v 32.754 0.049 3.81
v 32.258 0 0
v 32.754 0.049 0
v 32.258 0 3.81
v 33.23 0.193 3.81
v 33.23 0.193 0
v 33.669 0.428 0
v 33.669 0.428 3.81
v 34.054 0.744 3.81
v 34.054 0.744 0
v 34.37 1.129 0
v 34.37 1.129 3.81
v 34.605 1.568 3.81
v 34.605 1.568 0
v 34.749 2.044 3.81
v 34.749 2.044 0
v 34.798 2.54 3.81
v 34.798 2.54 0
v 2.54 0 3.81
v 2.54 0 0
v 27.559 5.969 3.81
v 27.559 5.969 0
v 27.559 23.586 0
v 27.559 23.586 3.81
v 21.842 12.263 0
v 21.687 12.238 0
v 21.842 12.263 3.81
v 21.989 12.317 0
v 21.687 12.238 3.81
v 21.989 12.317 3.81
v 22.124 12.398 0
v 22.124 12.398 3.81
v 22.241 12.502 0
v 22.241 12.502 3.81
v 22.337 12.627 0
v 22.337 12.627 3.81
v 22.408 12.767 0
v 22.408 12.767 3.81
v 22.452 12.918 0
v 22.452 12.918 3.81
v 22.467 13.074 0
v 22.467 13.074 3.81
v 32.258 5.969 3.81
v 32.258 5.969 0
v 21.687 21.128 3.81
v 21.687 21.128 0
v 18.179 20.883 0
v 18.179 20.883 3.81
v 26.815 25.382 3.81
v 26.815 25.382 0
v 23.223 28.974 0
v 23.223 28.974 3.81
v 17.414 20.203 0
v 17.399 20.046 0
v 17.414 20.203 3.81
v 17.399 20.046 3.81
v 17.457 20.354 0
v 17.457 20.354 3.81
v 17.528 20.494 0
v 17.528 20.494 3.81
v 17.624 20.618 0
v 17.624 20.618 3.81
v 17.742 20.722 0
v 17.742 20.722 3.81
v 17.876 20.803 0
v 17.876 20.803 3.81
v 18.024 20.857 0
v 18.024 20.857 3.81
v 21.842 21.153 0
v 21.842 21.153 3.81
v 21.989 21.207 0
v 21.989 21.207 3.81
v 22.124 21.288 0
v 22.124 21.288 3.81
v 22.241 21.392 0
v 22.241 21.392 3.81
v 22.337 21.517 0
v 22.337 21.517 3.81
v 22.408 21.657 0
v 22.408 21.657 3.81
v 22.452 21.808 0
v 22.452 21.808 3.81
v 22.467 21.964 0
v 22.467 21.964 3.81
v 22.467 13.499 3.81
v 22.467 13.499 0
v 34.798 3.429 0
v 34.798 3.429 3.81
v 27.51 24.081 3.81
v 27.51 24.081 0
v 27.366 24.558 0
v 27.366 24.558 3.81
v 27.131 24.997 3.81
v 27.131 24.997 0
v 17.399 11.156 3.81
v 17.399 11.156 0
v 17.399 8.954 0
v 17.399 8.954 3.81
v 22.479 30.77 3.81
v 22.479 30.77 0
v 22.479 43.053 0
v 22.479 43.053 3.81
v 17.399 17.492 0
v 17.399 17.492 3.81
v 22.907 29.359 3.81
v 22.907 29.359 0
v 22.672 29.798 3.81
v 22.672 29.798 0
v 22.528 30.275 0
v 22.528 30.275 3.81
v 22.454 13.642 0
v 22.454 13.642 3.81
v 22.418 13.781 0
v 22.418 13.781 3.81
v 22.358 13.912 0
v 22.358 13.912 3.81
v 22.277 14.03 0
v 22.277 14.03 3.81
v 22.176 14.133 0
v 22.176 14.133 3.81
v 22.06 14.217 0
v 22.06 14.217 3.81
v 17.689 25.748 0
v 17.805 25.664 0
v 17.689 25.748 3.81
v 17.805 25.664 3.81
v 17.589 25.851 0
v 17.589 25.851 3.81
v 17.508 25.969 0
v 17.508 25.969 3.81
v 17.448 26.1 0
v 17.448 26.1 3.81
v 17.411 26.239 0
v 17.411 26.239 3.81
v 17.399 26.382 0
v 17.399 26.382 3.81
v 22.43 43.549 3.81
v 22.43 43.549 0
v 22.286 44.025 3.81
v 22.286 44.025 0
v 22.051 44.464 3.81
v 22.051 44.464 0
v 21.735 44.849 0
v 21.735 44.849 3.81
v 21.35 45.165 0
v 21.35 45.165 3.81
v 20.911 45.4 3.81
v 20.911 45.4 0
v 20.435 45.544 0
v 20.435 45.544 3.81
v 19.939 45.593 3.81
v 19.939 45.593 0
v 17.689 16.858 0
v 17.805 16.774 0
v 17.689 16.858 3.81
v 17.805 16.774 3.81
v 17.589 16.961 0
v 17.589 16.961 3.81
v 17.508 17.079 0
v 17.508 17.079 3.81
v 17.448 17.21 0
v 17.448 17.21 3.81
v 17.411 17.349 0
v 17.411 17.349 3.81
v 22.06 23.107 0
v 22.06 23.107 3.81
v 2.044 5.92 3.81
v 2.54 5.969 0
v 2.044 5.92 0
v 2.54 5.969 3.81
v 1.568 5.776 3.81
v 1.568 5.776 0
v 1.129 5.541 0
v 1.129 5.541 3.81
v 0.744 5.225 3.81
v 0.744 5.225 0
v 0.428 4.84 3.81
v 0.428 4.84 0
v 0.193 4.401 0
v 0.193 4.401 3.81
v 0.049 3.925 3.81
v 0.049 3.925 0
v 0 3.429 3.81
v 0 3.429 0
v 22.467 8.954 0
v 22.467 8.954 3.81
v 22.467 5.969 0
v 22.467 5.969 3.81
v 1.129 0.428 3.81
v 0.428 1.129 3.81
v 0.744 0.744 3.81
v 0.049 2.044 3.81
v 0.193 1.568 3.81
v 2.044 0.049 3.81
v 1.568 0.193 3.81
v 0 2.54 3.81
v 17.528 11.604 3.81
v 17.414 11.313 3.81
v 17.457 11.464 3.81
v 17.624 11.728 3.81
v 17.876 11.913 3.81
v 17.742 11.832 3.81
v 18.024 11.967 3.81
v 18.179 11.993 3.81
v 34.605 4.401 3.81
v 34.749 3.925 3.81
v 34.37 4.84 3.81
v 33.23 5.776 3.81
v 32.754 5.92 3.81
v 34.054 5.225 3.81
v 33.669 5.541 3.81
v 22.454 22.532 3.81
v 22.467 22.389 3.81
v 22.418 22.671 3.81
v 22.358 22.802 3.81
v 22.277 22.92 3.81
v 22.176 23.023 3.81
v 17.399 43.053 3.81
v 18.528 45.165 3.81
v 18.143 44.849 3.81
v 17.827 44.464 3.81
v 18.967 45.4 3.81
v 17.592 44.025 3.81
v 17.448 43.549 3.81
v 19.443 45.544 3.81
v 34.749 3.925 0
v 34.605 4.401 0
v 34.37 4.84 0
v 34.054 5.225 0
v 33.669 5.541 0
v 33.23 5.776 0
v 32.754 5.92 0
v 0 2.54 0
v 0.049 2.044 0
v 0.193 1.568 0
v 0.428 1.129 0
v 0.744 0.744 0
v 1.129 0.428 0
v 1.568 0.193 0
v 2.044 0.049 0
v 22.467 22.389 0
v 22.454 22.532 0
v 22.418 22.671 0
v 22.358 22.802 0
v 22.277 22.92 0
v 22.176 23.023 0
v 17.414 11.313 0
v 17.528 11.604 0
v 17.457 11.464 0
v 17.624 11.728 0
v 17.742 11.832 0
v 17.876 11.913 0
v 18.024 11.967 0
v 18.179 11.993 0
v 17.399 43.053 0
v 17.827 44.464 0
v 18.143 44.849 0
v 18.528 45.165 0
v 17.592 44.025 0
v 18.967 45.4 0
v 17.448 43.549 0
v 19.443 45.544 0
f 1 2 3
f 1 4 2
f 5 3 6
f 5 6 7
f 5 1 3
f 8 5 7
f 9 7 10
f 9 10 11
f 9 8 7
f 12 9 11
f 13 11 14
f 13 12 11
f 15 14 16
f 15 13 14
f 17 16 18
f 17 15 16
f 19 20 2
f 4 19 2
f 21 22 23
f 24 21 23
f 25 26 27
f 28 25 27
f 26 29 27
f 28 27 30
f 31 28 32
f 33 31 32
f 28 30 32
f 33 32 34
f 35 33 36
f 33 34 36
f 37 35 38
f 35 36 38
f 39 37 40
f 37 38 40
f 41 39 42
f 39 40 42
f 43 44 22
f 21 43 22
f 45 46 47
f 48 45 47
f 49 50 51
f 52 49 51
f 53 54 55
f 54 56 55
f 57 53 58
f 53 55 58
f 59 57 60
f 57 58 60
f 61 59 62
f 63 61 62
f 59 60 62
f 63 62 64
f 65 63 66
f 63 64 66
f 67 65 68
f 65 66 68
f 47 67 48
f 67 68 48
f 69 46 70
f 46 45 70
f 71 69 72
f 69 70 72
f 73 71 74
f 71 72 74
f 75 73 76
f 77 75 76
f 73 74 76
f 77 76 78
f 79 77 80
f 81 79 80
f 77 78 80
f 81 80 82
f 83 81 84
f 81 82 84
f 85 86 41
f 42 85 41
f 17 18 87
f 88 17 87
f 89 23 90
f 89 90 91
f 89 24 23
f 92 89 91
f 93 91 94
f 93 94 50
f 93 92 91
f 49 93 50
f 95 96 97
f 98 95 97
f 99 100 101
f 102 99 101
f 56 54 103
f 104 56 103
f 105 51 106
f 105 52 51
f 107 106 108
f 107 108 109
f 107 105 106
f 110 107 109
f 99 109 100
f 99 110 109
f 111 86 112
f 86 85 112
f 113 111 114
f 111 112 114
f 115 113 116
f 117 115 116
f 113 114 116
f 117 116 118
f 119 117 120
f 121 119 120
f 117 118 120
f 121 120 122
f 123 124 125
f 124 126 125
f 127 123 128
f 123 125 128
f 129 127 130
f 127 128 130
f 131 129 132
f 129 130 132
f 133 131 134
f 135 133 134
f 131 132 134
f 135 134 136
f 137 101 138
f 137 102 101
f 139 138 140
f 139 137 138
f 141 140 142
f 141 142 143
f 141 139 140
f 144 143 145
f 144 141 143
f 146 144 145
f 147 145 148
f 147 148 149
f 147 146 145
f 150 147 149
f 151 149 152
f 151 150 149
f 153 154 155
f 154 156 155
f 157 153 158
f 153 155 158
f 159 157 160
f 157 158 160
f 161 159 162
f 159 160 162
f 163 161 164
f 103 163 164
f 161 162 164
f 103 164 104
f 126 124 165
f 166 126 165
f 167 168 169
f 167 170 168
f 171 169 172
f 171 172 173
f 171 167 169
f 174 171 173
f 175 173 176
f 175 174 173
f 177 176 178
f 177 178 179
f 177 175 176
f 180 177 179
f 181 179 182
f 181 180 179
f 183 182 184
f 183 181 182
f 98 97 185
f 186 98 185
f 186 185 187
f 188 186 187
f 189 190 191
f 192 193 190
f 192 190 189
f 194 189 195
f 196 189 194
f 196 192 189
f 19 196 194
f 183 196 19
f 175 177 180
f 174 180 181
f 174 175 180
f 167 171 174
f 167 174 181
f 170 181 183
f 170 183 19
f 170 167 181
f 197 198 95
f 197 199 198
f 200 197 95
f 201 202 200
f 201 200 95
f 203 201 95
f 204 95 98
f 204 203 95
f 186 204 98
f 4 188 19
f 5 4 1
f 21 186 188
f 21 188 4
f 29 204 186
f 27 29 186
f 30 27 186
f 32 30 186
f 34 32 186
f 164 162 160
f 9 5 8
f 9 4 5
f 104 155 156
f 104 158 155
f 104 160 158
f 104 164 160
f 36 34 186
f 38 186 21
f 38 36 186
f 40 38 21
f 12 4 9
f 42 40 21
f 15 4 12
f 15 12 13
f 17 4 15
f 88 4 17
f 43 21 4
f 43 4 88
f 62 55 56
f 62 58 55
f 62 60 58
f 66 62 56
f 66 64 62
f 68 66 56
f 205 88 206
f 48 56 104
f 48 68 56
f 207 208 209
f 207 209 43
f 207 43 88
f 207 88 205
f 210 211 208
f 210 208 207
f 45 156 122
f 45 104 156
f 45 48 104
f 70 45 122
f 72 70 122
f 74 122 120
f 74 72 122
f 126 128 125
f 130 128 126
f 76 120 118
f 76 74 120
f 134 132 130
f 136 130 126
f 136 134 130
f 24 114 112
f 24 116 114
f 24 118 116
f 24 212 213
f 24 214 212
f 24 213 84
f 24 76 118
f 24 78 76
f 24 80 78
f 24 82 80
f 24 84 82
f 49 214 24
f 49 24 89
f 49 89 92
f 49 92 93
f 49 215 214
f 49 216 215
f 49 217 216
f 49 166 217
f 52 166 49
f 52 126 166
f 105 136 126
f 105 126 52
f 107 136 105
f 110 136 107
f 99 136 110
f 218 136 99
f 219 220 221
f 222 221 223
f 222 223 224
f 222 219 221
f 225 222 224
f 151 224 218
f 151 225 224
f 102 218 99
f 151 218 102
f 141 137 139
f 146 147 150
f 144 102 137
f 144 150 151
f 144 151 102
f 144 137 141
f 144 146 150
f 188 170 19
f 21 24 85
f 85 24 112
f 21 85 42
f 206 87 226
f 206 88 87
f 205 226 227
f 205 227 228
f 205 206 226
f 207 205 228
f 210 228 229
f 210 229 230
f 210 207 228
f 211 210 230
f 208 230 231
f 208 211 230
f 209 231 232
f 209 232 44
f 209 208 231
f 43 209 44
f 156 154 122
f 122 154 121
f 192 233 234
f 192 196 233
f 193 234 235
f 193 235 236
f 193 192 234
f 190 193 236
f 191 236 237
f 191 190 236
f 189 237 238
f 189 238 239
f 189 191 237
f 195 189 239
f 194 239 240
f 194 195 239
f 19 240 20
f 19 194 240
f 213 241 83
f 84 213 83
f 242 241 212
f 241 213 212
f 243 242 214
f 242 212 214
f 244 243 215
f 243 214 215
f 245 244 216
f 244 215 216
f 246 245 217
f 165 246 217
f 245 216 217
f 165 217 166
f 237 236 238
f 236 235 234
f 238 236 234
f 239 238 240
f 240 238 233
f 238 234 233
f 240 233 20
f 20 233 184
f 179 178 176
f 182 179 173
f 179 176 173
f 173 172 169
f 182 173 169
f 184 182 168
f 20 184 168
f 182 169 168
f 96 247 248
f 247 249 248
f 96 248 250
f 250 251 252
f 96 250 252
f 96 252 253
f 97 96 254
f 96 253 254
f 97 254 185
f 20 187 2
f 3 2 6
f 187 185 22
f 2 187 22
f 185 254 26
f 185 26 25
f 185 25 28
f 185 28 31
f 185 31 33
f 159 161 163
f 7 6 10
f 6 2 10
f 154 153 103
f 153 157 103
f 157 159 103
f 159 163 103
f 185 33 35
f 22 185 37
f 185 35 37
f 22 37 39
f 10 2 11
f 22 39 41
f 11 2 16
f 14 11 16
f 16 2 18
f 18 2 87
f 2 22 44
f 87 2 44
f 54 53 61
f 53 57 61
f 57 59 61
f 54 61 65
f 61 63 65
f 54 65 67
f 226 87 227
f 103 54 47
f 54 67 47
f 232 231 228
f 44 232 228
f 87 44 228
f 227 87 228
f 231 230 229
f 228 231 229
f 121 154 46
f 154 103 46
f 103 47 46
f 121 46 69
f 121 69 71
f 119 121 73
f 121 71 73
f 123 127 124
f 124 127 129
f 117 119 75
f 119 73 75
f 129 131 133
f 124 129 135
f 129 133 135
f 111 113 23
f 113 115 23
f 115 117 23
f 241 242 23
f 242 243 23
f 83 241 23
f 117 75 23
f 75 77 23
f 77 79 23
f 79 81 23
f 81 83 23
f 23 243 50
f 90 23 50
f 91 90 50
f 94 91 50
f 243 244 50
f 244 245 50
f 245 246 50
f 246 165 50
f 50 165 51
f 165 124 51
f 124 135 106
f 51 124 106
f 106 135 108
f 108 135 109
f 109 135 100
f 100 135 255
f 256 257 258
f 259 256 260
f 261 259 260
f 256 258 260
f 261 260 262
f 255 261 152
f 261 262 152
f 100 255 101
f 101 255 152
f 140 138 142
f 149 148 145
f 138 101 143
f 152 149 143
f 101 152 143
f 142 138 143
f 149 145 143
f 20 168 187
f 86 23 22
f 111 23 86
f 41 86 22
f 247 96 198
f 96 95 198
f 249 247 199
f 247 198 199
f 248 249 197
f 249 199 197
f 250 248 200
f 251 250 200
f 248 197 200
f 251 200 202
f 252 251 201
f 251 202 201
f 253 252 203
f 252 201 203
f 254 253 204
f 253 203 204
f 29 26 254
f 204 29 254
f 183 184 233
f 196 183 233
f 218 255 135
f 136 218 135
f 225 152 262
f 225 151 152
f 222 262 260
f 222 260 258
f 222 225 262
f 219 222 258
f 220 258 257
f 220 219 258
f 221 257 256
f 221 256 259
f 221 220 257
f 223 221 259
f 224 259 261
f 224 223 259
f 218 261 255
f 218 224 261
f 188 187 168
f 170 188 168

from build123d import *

# Parameters (mm, degrees)
F0_W     = 5.08
F0_H     = 15.875
F1_DEPTH = 3.81
F2_R     = 2.53999
F3_R     = 0.8382


# Not quite as in the source:
# - two fillets or chamfers of one size are made in one step
# - a fillet or chamfer is up to 0.001 mm smaller than in the source, because OpenCascade refuses the exact size
# - a feature names something its author has since deleted; it is built from what else it names


with BuildPart() as f1:
    # F0 (on Top) → F1 (new body)
    with BuildSketch(Plane.XY):
        Polygon((22.4666253753, 12.2923628866), (17.399, 11.938), (27.559, 11.938), (27.559, 24.638), (22.479, 29.718), (17.399, 29.718), (17.399, 25.908), (22.4666253753, 22.86306348), (22.4666253753, 21.1823628866), (17.399, 20.828), (17.399, 17.018), (22.4666253753, 13.97306348), align=None)
        Polygon((0, 5.969), (0, 0), (34.798, 0), (34.798, 5.969), (27.559, 5.969), (27.559, 11.938), (17.399, 11.938), (17.399, 8.9535), (22.4666253753, 8.9535), (22.4666253753, 5.969), align=None)
        with Locations((19.939, 37.6555)):
            Rectangle(F0_W, F0_H)
    extrude(amount=F1_DEPTH)

    # F2 (radius 2.54 in the source; OpenCascade refuses exactly that, so slightly less here)
    f2_edges = [f1.edges().sort_by_distance(p)[0] for p in [
        (0, 0, 1.905),
        (34.798, 0, 1.905),
        (17.399, 45.593, 1.905),
        (22.479, 45.593, 1.905),
        (0, 5.969, 1.905),
        (34.798, 5.969, 1.905),
        (27.559, 24.638, 1.905),
        (22.479, 29.718, 1.905),
    ]]
    fillet(f2_edges, radius=F2_R)

    # F3
    f3_edges = [f1.edges().sort_by_distance(p)[0] for p in [
        (22.466625, 21.182363, 1.905),
        (22.466625, 22.863063, 1.905),
        (22.466625, 12.292363, 1.905),
        (22.466625, 13.973063, 1.905),
        (17.399, 11.938, 1.905),
        (17.399, 17.018, 1.905),
        (17.399, 20.828, 1.905),
        (17.399, 25.908, 1.905),
    ]]
    fillet(f3_edges, radius=F3_R)


solid = f1.part
